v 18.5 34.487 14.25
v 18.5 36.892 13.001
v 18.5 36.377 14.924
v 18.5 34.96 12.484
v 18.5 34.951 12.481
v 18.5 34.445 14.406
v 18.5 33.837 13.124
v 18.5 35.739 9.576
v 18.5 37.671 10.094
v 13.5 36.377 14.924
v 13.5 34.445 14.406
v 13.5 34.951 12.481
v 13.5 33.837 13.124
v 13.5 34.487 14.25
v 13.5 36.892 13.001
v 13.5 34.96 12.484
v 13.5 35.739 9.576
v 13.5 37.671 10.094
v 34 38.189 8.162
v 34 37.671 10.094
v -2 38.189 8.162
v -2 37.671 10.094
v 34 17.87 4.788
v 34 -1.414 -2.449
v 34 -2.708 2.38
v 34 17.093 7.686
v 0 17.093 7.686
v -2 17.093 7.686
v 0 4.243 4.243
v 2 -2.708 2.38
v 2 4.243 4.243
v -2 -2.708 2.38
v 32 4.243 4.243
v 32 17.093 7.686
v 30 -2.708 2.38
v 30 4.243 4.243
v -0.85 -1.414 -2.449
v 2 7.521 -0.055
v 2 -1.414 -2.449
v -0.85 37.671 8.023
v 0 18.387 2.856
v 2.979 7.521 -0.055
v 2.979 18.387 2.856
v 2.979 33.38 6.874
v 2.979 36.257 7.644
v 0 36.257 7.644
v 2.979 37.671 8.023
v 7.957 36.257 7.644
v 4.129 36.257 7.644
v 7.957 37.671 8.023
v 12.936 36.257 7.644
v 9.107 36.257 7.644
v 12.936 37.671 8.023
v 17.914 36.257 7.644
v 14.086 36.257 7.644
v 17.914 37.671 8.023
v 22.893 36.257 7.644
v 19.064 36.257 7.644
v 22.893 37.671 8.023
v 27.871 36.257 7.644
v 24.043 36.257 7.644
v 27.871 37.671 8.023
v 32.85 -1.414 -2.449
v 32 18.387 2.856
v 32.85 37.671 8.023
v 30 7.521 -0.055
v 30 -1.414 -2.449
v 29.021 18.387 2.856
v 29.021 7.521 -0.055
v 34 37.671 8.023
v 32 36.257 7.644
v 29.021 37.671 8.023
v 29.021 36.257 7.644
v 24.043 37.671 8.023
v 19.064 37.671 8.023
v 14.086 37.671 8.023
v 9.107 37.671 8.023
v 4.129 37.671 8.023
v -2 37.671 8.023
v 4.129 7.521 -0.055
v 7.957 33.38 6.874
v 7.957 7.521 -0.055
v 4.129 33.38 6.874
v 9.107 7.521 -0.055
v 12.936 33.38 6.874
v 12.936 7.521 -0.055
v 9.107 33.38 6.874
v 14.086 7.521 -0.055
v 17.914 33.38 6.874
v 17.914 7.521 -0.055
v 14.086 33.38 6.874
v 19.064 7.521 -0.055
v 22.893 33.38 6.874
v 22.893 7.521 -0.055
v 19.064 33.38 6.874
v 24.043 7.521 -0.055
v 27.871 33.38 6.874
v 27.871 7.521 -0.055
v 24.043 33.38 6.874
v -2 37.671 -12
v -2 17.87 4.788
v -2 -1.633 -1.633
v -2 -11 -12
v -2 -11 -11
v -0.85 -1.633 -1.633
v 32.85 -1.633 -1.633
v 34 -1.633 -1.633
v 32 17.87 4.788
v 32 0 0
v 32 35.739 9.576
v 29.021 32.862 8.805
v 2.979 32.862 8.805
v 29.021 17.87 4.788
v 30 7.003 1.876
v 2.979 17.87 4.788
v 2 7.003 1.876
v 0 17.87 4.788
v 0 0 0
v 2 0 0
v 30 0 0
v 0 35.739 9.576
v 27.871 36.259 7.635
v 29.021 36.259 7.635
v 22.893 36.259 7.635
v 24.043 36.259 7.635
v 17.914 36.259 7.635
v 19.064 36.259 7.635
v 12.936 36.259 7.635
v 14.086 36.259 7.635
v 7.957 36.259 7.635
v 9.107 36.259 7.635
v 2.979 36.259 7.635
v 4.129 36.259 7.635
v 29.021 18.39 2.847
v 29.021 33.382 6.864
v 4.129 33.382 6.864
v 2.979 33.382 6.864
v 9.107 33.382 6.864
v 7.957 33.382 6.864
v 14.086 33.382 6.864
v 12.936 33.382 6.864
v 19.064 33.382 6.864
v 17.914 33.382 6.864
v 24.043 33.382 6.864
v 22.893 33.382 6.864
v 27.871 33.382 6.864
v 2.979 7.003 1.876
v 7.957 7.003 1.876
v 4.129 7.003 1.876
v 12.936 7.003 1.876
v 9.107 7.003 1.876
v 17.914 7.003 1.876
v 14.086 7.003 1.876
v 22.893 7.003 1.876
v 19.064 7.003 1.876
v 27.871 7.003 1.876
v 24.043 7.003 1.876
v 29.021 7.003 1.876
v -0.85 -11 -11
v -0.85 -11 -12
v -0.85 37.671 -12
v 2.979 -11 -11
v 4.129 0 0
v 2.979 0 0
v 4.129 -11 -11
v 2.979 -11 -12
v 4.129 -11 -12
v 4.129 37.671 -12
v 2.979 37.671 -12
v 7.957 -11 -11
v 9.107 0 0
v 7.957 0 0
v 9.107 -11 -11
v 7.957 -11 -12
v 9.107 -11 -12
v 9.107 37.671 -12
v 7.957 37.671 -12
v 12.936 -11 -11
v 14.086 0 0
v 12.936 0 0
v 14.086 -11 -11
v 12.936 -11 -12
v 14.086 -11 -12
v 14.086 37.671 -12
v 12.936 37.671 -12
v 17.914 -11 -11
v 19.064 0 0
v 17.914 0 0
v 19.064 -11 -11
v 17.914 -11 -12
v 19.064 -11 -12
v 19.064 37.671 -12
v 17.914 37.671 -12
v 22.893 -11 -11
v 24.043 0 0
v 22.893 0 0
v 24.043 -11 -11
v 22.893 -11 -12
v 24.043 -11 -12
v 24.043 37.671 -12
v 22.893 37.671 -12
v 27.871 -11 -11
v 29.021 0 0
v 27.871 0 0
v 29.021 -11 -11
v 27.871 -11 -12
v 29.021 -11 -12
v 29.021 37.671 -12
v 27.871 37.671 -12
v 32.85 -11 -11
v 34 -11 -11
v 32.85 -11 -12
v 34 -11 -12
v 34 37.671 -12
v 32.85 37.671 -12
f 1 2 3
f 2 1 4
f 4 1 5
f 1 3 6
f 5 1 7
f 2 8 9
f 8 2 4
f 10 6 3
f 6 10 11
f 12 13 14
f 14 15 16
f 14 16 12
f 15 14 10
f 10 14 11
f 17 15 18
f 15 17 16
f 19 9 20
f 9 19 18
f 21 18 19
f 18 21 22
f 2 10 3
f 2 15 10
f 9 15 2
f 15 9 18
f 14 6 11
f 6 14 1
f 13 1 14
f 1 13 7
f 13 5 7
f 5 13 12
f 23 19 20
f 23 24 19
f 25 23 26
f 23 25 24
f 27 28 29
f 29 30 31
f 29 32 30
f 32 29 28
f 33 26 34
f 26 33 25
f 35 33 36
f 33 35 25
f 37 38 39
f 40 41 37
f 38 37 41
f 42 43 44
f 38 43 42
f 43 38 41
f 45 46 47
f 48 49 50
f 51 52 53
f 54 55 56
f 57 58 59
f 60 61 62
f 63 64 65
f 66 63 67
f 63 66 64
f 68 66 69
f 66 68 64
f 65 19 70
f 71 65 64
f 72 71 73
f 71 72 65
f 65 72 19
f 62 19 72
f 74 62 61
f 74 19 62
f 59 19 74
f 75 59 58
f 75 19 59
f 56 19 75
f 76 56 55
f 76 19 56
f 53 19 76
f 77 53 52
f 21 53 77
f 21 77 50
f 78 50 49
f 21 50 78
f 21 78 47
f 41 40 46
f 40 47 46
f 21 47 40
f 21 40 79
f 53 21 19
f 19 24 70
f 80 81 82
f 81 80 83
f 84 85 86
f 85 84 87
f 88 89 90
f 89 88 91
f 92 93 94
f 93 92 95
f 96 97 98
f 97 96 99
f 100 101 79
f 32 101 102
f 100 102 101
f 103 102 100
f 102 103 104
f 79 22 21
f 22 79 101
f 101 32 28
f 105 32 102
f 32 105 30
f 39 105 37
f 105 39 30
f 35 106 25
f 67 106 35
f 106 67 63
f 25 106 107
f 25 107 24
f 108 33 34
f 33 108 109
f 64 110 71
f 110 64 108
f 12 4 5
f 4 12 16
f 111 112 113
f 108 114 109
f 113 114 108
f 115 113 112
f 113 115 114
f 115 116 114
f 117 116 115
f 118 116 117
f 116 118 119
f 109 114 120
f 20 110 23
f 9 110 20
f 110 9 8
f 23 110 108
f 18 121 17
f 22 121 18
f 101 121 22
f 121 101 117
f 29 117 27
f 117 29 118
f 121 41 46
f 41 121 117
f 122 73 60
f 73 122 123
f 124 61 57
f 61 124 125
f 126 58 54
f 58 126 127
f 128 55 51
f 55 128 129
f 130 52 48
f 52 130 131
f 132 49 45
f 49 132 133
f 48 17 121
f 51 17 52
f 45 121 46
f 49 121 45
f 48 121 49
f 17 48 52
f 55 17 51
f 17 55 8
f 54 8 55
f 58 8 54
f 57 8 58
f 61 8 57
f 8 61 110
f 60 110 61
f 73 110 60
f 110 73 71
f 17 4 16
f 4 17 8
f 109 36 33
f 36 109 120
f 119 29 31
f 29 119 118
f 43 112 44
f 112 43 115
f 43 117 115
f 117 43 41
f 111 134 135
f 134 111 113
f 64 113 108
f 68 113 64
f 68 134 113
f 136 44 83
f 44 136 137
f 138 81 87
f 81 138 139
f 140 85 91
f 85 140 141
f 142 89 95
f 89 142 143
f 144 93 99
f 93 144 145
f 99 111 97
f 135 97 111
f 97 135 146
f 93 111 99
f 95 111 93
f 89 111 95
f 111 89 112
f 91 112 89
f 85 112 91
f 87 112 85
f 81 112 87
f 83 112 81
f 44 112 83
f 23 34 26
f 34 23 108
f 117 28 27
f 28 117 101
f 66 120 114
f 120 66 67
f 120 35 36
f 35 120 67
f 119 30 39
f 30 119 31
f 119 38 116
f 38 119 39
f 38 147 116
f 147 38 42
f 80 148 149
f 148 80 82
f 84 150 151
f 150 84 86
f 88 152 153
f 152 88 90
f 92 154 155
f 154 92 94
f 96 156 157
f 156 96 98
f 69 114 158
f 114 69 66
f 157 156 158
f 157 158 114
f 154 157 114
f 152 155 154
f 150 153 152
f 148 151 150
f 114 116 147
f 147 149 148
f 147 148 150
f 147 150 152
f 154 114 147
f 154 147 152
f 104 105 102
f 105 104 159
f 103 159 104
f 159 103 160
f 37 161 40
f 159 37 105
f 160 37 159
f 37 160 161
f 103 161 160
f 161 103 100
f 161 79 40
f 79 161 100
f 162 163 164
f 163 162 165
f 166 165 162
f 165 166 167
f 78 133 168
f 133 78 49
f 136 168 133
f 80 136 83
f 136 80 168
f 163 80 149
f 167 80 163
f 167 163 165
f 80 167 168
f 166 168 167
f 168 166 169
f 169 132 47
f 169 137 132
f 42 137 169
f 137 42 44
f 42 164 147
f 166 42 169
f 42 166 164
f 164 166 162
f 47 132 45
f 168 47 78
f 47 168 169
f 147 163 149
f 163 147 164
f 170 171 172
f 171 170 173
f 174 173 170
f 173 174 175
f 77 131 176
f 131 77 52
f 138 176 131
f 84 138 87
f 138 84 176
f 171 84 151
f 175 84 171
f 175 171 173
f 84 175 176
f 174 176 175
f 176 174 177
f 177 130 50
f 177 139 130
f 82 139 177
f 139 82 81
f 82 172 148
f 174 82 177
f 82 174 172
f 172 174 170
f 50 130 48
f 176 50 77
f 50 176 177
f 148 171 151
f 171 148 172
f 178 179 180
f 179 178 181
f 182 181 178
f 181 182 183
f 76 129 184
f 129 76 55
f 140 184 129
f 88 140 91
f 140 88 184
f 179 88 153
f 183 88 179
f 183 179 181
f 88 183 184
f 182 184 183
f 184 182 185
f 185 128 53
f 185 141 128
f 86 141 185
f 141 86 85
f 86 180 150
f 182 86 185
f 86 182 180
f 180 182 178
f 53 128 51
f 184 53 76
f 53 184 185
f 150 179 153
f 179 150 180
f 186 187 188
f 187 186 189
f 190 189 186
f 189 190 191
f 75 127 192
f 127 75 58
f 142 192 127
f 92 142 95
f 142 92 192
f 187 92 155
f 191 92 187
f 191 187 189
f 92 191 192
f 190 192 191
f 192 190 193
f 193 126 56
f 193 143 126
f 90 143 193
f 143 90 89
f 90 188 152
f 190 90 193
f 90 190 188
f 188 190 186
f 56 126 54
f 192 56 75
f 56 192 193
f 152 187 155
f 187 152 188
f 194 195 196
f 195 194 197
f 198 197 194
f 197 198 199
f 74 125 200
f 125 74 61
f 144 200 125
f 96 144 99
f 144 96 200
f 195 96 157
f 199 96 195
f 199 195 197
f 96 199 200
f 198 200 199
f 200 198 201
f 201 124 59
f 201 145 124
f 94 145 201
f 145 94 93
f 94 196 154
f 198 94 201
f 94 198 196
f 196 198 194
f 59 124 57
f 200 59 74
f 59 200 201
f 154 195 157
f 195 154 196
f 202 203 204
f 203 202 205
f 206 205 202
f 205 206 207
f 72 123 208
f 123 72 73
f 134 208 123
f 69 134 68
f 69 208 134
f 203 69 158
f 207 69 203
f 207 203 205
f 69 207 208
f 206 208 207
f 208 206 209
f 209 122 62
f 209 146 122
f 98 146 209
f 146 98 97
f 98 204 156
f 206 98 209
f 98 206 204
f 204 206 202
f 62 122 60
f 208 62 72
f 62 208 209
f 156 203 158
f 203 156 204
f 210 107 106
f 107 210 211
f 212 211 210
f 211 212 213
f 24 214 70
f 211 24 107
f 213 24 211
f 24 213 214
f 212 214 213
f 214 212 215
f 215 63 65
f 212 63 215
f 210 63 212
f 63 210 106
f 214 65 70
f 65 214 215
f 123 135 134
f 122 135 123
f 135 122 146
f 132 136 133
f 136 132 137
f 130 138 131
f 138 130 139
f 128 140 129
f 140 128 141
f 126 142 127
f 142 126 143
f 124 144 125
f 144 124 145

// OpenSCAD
/* [Basic] */

// The cutting height in mm
height = 12;

/* [Advanced] */

// The number of tines or teeth in the comb
tines = 8;

// the width of the tines
tine_width = 1.15;

// angle between the clipper and the base of the tines
base_angle = 15;

/* [Attachment] */

trimmer_width = 32;
trimmer_length = 37;
trimmer_height = 3;
attach_wall = 2;
attach_front_clip = 4;
attach_rear_clip = 5;
clip_depth = 1.3;

/* [Hidden] */

tol = 0.01;
tol2 = 0.02;
full_width = trimmer_width + attach_wall * 2;
full_length = trimmer_length + attach_wall * 2;
front_overlap = attach_front_clip - attach_wall;
tine_spacing = (full_width - tine_width) / (tines - 1);
spring_gap = tine_spacing - attach_wall;

module trimmer() {
    difference() {
        cube([trimmer_width, trimmer_length, trimmer_height+tol]);
        rotate([30,0,0])
        cube([trimmer_width, trimmer_length, trimmer_height]);
    }
}

//trimmer();

module trimmer_attach_diff() {
    trimmer();
    translate([0, trimmer_length/2, -attach_wall-tol])
        cube([spring_gap, trimmer_length/2, attach_wall+tol2]);
    translate([trimmer_width - spring_gap, trimmer_length/2, -attach_wall-tol])
        cube([spring_gap, trimmer_length/2, attach_wall+tol2]);
    translate([0, trimmer_length - spring_gap,-attach_wall-tol])
        cube([trimmer_width, spring_gap, attach_wall+tol2]);
    translate([-attach_wall-tol, trimmer_length/2, 0])
        cube([(full_width - attach_rear_clip)/2+tol, trimmer_length, trimmer_height+tol]);
    translate([(trimmer_width + attach_rear_clip)/2, trimmer_length/2, 0])
        cube([(full_width - attach_rear_clip)/2+tol, trimmer_length, trimmer_height+tol]);
    translate([-attach_wall-tol, trimmer_length/2, 0])
        cube([full_width+tol2, trimmer_length/2 - attach_wall, trimmer_height+tol]);
}

module trimmer_attach() {
    difference() {
        union() {
            translate([-attach_wall, -attach_wall, -attach_wall])
                cube([full_width, full_length, trimmer_height + attach_wall]);
            translate([(trimmer_width-attach_rear_clip)/2, trimmer_length, 0]) {
                cube([attach_rear_clip, attach_wall, attach_rear_clip]);
            translate([0, 0, trimmer_height]) rotate([45,0,0])
                cube([attach_rear_clip, clip_depth, clip_depth]);
            }
        }
        translate([front_overlap, -attach_wall, -attach_wall-tol])
            cube([trimmer_width - front_overlap * 2, trimmer_length/4, trimmer_height+attach_wall+tol2]);
        trimmer_attach_diff();
    }
}

//trimmer_attach();

module tine() {
    max_h = height + trimmer_length * sin(base_angle);
    len = height + (trimmer_length+attach_wall) * cos(base_angle);
    difference() {
        translate([0, -height, -height]) {
            difference() {
                cube([tine_width, len, max_h]);
                translate([-tol,0,0]) {
                    rotate([45,0,0])
                        cube([tine_width+tol2, len, max_h]);
                    translate([0,1,-tol]) rotate([90,0,0])
                        cube([tine_width+tol2, len, max_h]);
                }
            }
        }
        translate([-tol,0,0]) {
        rotate([base_angle,0,0])
            cube([tine_width+tol2, len, max_h]);
        }
    }
}

//tine();

module assembly() {
    difference() {
        union() {
            rotate([base_angle,0,0]) trimmer_attach();
            translate([-attach_wall,0,0]) {
                for (x=[0:tines-1])
                    translate([x * tine_spacing, 0, 0])
                        tine();
            }
        }
        rotate([base_angle,0,0]) trimmer_attach_diff();        
    }
}

assembly();
